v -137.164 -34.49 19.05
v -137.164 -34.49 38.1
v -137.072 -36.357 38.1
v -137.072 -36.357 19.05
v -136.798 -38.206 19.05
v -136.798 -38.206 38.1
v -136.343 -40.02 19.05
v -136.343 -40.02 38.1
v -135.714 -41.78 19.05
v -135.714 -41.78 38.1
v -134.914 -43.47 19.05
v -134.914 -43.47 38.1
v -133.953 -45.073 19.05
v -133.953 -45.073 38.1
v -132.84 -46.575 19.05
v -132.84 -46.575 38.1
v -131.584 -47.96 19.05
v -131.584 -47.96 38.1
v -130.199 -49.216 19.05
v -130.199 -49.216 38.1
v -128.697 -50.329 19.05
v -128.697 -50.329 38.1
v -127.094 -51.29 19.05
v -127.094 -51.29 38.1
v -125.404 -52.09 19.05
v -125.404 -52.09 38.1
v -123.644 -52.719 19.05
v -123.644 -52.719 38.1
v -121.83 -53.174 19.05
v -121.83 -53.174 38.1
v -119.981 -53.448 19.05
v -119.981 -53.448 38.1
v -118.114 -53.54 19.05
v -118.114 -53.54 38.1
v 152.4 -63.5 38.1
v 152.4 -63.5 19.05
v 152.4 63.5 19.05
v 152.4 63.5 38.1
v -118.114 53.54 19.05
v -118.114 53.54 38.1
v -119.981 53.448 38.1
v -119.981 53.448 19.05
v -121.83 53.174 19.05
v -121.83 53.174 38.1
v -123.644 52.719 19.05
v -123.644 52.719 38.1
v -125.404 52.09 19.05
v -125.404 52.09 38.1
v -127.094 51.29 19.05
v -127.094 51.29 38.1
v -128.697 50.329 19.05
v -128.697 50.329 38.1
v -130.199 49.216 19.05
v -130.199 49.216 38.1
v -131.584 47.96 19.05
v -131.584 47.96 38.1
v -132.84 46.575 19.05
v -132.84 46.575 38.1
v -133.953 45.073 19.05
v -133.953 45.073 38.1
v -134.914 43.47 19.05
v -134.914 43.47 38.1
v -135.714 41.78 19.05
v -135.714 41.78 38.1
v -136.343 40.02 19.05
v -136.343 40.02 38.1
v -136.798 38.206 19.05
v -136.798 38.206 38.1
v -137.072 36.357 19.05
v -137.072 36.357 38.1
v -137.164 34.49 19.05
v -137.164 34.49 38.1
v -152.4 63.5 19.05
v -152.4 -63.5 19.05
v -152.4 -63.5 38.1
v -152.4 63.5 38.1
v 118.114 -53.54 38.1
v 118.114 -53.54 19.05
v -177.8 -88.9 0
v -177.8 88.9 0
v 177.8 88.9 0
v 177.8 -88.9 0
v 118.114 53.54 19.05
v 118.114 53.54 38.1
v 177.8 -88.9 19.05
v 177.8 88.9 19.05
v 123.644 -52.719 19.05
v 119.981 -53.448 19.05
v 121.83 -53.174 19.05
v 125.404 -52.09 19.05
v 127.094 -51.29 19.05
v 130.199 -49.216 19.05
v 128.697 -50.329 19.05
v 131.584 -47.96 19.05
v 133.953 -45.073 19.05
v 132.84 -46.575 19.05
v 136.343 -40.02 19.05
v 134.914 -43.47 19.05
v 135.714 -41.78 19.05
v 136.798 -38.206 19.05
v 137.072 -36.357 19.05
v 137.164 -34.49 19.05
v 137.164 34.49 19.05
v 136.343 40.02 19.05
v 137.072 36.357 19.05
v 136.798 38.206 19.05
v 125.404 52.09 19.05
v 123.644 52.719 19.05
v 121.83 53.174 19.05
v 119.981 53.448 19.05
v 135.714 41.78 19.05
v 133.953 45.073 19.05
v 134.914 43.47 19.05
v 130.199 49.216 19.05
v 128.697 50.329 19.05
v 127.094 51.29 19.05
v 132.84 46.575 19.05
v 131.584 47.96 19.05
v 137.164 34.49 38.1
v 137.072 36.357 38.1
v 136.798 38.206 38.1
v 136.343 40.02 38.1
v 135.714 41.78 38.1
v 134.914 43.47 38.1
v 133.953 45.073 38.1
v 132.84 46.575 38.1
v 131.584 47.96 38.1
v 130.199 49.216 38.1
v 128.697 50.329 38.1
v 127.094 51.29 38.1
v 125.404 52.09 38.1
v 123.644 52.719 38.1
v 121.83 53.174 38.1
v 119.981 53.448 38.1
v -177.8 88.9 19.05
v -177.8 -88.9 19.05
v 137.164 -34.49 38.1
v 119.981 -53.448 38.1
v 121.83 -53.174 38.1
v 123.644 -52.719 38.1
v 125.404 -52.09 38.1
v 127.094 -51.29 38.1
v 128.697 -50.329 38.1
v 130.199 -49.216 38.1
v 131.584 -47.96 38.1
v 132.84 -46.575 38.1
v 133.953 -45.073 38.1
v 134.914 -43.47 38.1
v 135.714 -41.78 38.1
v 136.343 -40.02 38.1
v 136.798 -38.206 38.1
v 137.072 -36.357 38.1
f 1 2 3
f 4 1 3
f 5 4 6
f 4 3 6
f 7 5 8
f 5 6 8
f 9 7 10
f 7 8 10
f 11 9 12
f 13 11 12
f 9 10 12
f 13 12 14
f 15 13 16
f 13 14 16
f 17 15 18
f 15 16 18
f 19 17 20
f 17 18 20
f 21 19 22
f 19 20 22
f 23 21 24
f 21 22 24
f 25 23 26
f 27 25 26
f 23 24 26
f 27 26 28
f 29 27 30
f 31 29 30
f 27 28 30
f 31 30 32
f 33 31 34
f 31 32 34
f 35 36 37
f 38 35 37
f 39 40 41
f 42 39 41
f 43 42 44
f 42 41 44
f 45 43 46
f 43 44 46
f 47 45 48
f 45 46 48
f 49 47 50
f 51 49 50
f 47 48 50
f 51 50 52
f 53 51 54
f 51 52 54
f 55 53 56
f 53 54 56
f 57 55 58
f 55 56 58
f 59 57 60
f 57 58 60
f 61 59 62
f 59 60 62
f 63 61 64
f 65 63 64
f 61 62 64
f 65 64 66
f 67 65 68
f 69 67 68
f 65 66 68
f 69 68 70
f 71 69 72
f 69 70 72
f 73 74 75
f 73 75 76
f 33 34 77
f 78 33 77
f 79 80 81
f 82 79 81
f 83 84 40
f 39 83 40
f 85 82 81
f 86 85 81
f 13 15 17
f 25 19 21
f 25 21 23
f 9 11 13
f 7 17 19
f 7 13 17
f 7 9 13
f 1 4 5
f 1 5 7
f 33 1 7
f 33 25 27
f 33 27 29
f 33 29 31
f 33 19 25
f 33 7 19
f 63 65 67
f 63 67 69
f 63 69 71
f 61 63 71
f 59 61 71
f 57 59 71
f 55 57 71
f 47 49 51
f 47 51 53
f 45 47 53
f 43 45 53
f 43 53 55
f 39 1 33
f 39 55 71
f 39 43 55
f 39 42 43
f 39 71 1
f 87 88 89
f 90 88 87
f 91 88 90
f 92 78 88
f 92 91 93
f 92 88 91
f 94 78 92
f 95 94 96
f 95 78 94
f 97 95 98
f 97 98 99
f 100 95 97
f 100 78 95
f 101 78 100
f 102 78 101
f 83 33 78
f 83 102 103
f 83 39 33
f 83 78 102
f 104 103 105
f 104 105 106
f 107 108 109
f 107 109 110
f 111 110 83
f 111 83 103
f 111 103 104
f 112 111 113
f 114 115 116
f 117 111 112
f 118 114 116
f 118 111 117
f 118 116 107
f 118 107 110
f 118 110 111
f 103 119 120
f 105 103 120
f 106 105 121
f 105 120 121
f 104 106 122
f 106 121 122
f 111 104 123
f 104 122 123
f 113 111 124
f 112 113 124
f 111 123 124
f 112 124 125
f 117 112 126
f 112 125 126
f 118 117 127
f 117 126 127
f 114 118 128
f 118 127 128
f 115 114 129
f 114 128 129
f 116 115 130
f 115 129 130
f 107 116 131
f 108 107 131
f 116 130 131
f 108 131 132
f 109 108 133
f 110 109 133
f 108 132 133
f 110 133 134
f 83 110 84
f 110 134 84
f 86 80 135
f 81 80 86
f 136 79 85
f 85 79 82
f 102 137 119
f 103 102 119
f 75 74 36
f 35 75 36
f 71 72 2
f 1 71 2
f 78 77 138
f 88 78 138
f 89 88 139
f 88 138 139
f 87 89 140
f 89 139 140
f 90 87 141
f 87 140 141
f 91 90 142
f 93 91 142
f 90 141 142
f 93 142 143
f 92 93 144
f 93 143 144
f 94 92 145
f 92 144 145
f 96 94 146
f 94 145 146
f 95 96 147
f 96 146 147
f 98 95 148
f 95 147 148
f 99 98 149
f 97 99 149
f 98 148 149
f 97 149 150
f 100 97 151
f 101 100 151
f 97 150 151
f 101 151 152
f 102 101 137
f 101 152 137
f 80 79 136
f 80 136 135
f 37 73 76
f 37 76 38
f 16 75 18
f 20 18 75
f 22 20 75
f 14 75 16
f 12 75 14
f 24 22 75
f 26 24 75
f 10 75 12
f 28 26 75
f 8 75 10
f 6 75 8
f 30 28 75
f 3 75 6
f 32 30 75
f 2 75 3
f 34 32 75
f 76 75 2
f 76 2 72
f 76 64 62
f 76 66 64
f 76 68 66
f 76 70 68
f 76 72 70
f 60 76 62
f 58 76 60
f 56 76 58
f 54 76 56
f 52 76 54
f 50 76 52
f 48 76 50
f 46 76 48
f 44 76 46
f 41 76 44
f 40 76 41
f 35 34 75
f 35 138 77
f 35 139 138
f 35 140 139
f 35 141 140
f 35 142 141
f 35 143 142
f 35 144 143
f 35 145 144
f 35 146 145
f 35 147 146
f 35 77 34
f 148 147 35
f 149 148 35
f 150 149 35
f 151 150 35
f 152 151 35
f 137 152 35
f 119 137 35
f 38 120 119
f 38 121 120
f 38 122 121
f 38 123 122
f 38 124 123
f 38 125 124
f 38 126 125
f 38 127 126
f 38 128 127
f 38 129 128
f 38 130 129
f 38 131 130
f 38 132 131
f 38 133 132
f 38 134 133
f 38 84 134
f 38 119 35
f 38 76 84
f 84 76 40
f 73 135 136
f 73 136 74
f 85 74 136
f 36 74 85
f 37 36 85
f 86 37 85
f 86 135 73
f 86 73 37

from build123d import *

# Parameters (mm, degrees)
F0_W     = 355.6
F0_H     = 177.8
F1_DEPTH = 19.05
F2_W     = 304.8
F2_H     = 127
F3_DEPTH = 19.05
F5_DEPTH = 19.05


with BuildPart() as f1:
    # F0 (on Top) → F1 (new body)
    with BuildSketch(Plane.XY):
        Rectangle(F0_W, F0_H)
    extrude(amount=F1_DEPTH)

    # F2 (on face) → F3 (join)
    with BuildSketch(Plane.XY.offset(19.05)):
        Rectangle(F2_W, F2_H)
    extrude(amount=F3_DEPTH)

    # F4 (on face) → F5 (cut)
    with BuildSketch(Plane.XY.offset(38.1)):
        with BuildLine():
            ThreePointArc((-137.163756, -34.489753), (-131.58414, -47.960137), (-118.113756, -53.539753))
            Line((-118.113756, -53.539753), (118.113756, -53.539753))
            ThreePointArc((118.113756, -53.539753), (131.58414, -47.960137), (137.163756, -34.489753))
            Line((137.163756, -34.489753), (137.163756, 34.489753))
            ThreePointArc((137.163756, 34.489753), (131.58414, 47.960137), (118.113756, 53.539753))
            Line((118.113756, 53.539753), (-118.113756, 53.539753))
            ThreePointArc((-118.113756, 53.539753), (-131.58414, 47.960137), (-137.163756, 34.489753))
            Line((-137.163756, 34.489753), (-137.163756, -34.489753))
        make_face()
    extrude(amount=-F5_DEPTH, mode=Mode.SUBTRACT)


solid = f1.part
